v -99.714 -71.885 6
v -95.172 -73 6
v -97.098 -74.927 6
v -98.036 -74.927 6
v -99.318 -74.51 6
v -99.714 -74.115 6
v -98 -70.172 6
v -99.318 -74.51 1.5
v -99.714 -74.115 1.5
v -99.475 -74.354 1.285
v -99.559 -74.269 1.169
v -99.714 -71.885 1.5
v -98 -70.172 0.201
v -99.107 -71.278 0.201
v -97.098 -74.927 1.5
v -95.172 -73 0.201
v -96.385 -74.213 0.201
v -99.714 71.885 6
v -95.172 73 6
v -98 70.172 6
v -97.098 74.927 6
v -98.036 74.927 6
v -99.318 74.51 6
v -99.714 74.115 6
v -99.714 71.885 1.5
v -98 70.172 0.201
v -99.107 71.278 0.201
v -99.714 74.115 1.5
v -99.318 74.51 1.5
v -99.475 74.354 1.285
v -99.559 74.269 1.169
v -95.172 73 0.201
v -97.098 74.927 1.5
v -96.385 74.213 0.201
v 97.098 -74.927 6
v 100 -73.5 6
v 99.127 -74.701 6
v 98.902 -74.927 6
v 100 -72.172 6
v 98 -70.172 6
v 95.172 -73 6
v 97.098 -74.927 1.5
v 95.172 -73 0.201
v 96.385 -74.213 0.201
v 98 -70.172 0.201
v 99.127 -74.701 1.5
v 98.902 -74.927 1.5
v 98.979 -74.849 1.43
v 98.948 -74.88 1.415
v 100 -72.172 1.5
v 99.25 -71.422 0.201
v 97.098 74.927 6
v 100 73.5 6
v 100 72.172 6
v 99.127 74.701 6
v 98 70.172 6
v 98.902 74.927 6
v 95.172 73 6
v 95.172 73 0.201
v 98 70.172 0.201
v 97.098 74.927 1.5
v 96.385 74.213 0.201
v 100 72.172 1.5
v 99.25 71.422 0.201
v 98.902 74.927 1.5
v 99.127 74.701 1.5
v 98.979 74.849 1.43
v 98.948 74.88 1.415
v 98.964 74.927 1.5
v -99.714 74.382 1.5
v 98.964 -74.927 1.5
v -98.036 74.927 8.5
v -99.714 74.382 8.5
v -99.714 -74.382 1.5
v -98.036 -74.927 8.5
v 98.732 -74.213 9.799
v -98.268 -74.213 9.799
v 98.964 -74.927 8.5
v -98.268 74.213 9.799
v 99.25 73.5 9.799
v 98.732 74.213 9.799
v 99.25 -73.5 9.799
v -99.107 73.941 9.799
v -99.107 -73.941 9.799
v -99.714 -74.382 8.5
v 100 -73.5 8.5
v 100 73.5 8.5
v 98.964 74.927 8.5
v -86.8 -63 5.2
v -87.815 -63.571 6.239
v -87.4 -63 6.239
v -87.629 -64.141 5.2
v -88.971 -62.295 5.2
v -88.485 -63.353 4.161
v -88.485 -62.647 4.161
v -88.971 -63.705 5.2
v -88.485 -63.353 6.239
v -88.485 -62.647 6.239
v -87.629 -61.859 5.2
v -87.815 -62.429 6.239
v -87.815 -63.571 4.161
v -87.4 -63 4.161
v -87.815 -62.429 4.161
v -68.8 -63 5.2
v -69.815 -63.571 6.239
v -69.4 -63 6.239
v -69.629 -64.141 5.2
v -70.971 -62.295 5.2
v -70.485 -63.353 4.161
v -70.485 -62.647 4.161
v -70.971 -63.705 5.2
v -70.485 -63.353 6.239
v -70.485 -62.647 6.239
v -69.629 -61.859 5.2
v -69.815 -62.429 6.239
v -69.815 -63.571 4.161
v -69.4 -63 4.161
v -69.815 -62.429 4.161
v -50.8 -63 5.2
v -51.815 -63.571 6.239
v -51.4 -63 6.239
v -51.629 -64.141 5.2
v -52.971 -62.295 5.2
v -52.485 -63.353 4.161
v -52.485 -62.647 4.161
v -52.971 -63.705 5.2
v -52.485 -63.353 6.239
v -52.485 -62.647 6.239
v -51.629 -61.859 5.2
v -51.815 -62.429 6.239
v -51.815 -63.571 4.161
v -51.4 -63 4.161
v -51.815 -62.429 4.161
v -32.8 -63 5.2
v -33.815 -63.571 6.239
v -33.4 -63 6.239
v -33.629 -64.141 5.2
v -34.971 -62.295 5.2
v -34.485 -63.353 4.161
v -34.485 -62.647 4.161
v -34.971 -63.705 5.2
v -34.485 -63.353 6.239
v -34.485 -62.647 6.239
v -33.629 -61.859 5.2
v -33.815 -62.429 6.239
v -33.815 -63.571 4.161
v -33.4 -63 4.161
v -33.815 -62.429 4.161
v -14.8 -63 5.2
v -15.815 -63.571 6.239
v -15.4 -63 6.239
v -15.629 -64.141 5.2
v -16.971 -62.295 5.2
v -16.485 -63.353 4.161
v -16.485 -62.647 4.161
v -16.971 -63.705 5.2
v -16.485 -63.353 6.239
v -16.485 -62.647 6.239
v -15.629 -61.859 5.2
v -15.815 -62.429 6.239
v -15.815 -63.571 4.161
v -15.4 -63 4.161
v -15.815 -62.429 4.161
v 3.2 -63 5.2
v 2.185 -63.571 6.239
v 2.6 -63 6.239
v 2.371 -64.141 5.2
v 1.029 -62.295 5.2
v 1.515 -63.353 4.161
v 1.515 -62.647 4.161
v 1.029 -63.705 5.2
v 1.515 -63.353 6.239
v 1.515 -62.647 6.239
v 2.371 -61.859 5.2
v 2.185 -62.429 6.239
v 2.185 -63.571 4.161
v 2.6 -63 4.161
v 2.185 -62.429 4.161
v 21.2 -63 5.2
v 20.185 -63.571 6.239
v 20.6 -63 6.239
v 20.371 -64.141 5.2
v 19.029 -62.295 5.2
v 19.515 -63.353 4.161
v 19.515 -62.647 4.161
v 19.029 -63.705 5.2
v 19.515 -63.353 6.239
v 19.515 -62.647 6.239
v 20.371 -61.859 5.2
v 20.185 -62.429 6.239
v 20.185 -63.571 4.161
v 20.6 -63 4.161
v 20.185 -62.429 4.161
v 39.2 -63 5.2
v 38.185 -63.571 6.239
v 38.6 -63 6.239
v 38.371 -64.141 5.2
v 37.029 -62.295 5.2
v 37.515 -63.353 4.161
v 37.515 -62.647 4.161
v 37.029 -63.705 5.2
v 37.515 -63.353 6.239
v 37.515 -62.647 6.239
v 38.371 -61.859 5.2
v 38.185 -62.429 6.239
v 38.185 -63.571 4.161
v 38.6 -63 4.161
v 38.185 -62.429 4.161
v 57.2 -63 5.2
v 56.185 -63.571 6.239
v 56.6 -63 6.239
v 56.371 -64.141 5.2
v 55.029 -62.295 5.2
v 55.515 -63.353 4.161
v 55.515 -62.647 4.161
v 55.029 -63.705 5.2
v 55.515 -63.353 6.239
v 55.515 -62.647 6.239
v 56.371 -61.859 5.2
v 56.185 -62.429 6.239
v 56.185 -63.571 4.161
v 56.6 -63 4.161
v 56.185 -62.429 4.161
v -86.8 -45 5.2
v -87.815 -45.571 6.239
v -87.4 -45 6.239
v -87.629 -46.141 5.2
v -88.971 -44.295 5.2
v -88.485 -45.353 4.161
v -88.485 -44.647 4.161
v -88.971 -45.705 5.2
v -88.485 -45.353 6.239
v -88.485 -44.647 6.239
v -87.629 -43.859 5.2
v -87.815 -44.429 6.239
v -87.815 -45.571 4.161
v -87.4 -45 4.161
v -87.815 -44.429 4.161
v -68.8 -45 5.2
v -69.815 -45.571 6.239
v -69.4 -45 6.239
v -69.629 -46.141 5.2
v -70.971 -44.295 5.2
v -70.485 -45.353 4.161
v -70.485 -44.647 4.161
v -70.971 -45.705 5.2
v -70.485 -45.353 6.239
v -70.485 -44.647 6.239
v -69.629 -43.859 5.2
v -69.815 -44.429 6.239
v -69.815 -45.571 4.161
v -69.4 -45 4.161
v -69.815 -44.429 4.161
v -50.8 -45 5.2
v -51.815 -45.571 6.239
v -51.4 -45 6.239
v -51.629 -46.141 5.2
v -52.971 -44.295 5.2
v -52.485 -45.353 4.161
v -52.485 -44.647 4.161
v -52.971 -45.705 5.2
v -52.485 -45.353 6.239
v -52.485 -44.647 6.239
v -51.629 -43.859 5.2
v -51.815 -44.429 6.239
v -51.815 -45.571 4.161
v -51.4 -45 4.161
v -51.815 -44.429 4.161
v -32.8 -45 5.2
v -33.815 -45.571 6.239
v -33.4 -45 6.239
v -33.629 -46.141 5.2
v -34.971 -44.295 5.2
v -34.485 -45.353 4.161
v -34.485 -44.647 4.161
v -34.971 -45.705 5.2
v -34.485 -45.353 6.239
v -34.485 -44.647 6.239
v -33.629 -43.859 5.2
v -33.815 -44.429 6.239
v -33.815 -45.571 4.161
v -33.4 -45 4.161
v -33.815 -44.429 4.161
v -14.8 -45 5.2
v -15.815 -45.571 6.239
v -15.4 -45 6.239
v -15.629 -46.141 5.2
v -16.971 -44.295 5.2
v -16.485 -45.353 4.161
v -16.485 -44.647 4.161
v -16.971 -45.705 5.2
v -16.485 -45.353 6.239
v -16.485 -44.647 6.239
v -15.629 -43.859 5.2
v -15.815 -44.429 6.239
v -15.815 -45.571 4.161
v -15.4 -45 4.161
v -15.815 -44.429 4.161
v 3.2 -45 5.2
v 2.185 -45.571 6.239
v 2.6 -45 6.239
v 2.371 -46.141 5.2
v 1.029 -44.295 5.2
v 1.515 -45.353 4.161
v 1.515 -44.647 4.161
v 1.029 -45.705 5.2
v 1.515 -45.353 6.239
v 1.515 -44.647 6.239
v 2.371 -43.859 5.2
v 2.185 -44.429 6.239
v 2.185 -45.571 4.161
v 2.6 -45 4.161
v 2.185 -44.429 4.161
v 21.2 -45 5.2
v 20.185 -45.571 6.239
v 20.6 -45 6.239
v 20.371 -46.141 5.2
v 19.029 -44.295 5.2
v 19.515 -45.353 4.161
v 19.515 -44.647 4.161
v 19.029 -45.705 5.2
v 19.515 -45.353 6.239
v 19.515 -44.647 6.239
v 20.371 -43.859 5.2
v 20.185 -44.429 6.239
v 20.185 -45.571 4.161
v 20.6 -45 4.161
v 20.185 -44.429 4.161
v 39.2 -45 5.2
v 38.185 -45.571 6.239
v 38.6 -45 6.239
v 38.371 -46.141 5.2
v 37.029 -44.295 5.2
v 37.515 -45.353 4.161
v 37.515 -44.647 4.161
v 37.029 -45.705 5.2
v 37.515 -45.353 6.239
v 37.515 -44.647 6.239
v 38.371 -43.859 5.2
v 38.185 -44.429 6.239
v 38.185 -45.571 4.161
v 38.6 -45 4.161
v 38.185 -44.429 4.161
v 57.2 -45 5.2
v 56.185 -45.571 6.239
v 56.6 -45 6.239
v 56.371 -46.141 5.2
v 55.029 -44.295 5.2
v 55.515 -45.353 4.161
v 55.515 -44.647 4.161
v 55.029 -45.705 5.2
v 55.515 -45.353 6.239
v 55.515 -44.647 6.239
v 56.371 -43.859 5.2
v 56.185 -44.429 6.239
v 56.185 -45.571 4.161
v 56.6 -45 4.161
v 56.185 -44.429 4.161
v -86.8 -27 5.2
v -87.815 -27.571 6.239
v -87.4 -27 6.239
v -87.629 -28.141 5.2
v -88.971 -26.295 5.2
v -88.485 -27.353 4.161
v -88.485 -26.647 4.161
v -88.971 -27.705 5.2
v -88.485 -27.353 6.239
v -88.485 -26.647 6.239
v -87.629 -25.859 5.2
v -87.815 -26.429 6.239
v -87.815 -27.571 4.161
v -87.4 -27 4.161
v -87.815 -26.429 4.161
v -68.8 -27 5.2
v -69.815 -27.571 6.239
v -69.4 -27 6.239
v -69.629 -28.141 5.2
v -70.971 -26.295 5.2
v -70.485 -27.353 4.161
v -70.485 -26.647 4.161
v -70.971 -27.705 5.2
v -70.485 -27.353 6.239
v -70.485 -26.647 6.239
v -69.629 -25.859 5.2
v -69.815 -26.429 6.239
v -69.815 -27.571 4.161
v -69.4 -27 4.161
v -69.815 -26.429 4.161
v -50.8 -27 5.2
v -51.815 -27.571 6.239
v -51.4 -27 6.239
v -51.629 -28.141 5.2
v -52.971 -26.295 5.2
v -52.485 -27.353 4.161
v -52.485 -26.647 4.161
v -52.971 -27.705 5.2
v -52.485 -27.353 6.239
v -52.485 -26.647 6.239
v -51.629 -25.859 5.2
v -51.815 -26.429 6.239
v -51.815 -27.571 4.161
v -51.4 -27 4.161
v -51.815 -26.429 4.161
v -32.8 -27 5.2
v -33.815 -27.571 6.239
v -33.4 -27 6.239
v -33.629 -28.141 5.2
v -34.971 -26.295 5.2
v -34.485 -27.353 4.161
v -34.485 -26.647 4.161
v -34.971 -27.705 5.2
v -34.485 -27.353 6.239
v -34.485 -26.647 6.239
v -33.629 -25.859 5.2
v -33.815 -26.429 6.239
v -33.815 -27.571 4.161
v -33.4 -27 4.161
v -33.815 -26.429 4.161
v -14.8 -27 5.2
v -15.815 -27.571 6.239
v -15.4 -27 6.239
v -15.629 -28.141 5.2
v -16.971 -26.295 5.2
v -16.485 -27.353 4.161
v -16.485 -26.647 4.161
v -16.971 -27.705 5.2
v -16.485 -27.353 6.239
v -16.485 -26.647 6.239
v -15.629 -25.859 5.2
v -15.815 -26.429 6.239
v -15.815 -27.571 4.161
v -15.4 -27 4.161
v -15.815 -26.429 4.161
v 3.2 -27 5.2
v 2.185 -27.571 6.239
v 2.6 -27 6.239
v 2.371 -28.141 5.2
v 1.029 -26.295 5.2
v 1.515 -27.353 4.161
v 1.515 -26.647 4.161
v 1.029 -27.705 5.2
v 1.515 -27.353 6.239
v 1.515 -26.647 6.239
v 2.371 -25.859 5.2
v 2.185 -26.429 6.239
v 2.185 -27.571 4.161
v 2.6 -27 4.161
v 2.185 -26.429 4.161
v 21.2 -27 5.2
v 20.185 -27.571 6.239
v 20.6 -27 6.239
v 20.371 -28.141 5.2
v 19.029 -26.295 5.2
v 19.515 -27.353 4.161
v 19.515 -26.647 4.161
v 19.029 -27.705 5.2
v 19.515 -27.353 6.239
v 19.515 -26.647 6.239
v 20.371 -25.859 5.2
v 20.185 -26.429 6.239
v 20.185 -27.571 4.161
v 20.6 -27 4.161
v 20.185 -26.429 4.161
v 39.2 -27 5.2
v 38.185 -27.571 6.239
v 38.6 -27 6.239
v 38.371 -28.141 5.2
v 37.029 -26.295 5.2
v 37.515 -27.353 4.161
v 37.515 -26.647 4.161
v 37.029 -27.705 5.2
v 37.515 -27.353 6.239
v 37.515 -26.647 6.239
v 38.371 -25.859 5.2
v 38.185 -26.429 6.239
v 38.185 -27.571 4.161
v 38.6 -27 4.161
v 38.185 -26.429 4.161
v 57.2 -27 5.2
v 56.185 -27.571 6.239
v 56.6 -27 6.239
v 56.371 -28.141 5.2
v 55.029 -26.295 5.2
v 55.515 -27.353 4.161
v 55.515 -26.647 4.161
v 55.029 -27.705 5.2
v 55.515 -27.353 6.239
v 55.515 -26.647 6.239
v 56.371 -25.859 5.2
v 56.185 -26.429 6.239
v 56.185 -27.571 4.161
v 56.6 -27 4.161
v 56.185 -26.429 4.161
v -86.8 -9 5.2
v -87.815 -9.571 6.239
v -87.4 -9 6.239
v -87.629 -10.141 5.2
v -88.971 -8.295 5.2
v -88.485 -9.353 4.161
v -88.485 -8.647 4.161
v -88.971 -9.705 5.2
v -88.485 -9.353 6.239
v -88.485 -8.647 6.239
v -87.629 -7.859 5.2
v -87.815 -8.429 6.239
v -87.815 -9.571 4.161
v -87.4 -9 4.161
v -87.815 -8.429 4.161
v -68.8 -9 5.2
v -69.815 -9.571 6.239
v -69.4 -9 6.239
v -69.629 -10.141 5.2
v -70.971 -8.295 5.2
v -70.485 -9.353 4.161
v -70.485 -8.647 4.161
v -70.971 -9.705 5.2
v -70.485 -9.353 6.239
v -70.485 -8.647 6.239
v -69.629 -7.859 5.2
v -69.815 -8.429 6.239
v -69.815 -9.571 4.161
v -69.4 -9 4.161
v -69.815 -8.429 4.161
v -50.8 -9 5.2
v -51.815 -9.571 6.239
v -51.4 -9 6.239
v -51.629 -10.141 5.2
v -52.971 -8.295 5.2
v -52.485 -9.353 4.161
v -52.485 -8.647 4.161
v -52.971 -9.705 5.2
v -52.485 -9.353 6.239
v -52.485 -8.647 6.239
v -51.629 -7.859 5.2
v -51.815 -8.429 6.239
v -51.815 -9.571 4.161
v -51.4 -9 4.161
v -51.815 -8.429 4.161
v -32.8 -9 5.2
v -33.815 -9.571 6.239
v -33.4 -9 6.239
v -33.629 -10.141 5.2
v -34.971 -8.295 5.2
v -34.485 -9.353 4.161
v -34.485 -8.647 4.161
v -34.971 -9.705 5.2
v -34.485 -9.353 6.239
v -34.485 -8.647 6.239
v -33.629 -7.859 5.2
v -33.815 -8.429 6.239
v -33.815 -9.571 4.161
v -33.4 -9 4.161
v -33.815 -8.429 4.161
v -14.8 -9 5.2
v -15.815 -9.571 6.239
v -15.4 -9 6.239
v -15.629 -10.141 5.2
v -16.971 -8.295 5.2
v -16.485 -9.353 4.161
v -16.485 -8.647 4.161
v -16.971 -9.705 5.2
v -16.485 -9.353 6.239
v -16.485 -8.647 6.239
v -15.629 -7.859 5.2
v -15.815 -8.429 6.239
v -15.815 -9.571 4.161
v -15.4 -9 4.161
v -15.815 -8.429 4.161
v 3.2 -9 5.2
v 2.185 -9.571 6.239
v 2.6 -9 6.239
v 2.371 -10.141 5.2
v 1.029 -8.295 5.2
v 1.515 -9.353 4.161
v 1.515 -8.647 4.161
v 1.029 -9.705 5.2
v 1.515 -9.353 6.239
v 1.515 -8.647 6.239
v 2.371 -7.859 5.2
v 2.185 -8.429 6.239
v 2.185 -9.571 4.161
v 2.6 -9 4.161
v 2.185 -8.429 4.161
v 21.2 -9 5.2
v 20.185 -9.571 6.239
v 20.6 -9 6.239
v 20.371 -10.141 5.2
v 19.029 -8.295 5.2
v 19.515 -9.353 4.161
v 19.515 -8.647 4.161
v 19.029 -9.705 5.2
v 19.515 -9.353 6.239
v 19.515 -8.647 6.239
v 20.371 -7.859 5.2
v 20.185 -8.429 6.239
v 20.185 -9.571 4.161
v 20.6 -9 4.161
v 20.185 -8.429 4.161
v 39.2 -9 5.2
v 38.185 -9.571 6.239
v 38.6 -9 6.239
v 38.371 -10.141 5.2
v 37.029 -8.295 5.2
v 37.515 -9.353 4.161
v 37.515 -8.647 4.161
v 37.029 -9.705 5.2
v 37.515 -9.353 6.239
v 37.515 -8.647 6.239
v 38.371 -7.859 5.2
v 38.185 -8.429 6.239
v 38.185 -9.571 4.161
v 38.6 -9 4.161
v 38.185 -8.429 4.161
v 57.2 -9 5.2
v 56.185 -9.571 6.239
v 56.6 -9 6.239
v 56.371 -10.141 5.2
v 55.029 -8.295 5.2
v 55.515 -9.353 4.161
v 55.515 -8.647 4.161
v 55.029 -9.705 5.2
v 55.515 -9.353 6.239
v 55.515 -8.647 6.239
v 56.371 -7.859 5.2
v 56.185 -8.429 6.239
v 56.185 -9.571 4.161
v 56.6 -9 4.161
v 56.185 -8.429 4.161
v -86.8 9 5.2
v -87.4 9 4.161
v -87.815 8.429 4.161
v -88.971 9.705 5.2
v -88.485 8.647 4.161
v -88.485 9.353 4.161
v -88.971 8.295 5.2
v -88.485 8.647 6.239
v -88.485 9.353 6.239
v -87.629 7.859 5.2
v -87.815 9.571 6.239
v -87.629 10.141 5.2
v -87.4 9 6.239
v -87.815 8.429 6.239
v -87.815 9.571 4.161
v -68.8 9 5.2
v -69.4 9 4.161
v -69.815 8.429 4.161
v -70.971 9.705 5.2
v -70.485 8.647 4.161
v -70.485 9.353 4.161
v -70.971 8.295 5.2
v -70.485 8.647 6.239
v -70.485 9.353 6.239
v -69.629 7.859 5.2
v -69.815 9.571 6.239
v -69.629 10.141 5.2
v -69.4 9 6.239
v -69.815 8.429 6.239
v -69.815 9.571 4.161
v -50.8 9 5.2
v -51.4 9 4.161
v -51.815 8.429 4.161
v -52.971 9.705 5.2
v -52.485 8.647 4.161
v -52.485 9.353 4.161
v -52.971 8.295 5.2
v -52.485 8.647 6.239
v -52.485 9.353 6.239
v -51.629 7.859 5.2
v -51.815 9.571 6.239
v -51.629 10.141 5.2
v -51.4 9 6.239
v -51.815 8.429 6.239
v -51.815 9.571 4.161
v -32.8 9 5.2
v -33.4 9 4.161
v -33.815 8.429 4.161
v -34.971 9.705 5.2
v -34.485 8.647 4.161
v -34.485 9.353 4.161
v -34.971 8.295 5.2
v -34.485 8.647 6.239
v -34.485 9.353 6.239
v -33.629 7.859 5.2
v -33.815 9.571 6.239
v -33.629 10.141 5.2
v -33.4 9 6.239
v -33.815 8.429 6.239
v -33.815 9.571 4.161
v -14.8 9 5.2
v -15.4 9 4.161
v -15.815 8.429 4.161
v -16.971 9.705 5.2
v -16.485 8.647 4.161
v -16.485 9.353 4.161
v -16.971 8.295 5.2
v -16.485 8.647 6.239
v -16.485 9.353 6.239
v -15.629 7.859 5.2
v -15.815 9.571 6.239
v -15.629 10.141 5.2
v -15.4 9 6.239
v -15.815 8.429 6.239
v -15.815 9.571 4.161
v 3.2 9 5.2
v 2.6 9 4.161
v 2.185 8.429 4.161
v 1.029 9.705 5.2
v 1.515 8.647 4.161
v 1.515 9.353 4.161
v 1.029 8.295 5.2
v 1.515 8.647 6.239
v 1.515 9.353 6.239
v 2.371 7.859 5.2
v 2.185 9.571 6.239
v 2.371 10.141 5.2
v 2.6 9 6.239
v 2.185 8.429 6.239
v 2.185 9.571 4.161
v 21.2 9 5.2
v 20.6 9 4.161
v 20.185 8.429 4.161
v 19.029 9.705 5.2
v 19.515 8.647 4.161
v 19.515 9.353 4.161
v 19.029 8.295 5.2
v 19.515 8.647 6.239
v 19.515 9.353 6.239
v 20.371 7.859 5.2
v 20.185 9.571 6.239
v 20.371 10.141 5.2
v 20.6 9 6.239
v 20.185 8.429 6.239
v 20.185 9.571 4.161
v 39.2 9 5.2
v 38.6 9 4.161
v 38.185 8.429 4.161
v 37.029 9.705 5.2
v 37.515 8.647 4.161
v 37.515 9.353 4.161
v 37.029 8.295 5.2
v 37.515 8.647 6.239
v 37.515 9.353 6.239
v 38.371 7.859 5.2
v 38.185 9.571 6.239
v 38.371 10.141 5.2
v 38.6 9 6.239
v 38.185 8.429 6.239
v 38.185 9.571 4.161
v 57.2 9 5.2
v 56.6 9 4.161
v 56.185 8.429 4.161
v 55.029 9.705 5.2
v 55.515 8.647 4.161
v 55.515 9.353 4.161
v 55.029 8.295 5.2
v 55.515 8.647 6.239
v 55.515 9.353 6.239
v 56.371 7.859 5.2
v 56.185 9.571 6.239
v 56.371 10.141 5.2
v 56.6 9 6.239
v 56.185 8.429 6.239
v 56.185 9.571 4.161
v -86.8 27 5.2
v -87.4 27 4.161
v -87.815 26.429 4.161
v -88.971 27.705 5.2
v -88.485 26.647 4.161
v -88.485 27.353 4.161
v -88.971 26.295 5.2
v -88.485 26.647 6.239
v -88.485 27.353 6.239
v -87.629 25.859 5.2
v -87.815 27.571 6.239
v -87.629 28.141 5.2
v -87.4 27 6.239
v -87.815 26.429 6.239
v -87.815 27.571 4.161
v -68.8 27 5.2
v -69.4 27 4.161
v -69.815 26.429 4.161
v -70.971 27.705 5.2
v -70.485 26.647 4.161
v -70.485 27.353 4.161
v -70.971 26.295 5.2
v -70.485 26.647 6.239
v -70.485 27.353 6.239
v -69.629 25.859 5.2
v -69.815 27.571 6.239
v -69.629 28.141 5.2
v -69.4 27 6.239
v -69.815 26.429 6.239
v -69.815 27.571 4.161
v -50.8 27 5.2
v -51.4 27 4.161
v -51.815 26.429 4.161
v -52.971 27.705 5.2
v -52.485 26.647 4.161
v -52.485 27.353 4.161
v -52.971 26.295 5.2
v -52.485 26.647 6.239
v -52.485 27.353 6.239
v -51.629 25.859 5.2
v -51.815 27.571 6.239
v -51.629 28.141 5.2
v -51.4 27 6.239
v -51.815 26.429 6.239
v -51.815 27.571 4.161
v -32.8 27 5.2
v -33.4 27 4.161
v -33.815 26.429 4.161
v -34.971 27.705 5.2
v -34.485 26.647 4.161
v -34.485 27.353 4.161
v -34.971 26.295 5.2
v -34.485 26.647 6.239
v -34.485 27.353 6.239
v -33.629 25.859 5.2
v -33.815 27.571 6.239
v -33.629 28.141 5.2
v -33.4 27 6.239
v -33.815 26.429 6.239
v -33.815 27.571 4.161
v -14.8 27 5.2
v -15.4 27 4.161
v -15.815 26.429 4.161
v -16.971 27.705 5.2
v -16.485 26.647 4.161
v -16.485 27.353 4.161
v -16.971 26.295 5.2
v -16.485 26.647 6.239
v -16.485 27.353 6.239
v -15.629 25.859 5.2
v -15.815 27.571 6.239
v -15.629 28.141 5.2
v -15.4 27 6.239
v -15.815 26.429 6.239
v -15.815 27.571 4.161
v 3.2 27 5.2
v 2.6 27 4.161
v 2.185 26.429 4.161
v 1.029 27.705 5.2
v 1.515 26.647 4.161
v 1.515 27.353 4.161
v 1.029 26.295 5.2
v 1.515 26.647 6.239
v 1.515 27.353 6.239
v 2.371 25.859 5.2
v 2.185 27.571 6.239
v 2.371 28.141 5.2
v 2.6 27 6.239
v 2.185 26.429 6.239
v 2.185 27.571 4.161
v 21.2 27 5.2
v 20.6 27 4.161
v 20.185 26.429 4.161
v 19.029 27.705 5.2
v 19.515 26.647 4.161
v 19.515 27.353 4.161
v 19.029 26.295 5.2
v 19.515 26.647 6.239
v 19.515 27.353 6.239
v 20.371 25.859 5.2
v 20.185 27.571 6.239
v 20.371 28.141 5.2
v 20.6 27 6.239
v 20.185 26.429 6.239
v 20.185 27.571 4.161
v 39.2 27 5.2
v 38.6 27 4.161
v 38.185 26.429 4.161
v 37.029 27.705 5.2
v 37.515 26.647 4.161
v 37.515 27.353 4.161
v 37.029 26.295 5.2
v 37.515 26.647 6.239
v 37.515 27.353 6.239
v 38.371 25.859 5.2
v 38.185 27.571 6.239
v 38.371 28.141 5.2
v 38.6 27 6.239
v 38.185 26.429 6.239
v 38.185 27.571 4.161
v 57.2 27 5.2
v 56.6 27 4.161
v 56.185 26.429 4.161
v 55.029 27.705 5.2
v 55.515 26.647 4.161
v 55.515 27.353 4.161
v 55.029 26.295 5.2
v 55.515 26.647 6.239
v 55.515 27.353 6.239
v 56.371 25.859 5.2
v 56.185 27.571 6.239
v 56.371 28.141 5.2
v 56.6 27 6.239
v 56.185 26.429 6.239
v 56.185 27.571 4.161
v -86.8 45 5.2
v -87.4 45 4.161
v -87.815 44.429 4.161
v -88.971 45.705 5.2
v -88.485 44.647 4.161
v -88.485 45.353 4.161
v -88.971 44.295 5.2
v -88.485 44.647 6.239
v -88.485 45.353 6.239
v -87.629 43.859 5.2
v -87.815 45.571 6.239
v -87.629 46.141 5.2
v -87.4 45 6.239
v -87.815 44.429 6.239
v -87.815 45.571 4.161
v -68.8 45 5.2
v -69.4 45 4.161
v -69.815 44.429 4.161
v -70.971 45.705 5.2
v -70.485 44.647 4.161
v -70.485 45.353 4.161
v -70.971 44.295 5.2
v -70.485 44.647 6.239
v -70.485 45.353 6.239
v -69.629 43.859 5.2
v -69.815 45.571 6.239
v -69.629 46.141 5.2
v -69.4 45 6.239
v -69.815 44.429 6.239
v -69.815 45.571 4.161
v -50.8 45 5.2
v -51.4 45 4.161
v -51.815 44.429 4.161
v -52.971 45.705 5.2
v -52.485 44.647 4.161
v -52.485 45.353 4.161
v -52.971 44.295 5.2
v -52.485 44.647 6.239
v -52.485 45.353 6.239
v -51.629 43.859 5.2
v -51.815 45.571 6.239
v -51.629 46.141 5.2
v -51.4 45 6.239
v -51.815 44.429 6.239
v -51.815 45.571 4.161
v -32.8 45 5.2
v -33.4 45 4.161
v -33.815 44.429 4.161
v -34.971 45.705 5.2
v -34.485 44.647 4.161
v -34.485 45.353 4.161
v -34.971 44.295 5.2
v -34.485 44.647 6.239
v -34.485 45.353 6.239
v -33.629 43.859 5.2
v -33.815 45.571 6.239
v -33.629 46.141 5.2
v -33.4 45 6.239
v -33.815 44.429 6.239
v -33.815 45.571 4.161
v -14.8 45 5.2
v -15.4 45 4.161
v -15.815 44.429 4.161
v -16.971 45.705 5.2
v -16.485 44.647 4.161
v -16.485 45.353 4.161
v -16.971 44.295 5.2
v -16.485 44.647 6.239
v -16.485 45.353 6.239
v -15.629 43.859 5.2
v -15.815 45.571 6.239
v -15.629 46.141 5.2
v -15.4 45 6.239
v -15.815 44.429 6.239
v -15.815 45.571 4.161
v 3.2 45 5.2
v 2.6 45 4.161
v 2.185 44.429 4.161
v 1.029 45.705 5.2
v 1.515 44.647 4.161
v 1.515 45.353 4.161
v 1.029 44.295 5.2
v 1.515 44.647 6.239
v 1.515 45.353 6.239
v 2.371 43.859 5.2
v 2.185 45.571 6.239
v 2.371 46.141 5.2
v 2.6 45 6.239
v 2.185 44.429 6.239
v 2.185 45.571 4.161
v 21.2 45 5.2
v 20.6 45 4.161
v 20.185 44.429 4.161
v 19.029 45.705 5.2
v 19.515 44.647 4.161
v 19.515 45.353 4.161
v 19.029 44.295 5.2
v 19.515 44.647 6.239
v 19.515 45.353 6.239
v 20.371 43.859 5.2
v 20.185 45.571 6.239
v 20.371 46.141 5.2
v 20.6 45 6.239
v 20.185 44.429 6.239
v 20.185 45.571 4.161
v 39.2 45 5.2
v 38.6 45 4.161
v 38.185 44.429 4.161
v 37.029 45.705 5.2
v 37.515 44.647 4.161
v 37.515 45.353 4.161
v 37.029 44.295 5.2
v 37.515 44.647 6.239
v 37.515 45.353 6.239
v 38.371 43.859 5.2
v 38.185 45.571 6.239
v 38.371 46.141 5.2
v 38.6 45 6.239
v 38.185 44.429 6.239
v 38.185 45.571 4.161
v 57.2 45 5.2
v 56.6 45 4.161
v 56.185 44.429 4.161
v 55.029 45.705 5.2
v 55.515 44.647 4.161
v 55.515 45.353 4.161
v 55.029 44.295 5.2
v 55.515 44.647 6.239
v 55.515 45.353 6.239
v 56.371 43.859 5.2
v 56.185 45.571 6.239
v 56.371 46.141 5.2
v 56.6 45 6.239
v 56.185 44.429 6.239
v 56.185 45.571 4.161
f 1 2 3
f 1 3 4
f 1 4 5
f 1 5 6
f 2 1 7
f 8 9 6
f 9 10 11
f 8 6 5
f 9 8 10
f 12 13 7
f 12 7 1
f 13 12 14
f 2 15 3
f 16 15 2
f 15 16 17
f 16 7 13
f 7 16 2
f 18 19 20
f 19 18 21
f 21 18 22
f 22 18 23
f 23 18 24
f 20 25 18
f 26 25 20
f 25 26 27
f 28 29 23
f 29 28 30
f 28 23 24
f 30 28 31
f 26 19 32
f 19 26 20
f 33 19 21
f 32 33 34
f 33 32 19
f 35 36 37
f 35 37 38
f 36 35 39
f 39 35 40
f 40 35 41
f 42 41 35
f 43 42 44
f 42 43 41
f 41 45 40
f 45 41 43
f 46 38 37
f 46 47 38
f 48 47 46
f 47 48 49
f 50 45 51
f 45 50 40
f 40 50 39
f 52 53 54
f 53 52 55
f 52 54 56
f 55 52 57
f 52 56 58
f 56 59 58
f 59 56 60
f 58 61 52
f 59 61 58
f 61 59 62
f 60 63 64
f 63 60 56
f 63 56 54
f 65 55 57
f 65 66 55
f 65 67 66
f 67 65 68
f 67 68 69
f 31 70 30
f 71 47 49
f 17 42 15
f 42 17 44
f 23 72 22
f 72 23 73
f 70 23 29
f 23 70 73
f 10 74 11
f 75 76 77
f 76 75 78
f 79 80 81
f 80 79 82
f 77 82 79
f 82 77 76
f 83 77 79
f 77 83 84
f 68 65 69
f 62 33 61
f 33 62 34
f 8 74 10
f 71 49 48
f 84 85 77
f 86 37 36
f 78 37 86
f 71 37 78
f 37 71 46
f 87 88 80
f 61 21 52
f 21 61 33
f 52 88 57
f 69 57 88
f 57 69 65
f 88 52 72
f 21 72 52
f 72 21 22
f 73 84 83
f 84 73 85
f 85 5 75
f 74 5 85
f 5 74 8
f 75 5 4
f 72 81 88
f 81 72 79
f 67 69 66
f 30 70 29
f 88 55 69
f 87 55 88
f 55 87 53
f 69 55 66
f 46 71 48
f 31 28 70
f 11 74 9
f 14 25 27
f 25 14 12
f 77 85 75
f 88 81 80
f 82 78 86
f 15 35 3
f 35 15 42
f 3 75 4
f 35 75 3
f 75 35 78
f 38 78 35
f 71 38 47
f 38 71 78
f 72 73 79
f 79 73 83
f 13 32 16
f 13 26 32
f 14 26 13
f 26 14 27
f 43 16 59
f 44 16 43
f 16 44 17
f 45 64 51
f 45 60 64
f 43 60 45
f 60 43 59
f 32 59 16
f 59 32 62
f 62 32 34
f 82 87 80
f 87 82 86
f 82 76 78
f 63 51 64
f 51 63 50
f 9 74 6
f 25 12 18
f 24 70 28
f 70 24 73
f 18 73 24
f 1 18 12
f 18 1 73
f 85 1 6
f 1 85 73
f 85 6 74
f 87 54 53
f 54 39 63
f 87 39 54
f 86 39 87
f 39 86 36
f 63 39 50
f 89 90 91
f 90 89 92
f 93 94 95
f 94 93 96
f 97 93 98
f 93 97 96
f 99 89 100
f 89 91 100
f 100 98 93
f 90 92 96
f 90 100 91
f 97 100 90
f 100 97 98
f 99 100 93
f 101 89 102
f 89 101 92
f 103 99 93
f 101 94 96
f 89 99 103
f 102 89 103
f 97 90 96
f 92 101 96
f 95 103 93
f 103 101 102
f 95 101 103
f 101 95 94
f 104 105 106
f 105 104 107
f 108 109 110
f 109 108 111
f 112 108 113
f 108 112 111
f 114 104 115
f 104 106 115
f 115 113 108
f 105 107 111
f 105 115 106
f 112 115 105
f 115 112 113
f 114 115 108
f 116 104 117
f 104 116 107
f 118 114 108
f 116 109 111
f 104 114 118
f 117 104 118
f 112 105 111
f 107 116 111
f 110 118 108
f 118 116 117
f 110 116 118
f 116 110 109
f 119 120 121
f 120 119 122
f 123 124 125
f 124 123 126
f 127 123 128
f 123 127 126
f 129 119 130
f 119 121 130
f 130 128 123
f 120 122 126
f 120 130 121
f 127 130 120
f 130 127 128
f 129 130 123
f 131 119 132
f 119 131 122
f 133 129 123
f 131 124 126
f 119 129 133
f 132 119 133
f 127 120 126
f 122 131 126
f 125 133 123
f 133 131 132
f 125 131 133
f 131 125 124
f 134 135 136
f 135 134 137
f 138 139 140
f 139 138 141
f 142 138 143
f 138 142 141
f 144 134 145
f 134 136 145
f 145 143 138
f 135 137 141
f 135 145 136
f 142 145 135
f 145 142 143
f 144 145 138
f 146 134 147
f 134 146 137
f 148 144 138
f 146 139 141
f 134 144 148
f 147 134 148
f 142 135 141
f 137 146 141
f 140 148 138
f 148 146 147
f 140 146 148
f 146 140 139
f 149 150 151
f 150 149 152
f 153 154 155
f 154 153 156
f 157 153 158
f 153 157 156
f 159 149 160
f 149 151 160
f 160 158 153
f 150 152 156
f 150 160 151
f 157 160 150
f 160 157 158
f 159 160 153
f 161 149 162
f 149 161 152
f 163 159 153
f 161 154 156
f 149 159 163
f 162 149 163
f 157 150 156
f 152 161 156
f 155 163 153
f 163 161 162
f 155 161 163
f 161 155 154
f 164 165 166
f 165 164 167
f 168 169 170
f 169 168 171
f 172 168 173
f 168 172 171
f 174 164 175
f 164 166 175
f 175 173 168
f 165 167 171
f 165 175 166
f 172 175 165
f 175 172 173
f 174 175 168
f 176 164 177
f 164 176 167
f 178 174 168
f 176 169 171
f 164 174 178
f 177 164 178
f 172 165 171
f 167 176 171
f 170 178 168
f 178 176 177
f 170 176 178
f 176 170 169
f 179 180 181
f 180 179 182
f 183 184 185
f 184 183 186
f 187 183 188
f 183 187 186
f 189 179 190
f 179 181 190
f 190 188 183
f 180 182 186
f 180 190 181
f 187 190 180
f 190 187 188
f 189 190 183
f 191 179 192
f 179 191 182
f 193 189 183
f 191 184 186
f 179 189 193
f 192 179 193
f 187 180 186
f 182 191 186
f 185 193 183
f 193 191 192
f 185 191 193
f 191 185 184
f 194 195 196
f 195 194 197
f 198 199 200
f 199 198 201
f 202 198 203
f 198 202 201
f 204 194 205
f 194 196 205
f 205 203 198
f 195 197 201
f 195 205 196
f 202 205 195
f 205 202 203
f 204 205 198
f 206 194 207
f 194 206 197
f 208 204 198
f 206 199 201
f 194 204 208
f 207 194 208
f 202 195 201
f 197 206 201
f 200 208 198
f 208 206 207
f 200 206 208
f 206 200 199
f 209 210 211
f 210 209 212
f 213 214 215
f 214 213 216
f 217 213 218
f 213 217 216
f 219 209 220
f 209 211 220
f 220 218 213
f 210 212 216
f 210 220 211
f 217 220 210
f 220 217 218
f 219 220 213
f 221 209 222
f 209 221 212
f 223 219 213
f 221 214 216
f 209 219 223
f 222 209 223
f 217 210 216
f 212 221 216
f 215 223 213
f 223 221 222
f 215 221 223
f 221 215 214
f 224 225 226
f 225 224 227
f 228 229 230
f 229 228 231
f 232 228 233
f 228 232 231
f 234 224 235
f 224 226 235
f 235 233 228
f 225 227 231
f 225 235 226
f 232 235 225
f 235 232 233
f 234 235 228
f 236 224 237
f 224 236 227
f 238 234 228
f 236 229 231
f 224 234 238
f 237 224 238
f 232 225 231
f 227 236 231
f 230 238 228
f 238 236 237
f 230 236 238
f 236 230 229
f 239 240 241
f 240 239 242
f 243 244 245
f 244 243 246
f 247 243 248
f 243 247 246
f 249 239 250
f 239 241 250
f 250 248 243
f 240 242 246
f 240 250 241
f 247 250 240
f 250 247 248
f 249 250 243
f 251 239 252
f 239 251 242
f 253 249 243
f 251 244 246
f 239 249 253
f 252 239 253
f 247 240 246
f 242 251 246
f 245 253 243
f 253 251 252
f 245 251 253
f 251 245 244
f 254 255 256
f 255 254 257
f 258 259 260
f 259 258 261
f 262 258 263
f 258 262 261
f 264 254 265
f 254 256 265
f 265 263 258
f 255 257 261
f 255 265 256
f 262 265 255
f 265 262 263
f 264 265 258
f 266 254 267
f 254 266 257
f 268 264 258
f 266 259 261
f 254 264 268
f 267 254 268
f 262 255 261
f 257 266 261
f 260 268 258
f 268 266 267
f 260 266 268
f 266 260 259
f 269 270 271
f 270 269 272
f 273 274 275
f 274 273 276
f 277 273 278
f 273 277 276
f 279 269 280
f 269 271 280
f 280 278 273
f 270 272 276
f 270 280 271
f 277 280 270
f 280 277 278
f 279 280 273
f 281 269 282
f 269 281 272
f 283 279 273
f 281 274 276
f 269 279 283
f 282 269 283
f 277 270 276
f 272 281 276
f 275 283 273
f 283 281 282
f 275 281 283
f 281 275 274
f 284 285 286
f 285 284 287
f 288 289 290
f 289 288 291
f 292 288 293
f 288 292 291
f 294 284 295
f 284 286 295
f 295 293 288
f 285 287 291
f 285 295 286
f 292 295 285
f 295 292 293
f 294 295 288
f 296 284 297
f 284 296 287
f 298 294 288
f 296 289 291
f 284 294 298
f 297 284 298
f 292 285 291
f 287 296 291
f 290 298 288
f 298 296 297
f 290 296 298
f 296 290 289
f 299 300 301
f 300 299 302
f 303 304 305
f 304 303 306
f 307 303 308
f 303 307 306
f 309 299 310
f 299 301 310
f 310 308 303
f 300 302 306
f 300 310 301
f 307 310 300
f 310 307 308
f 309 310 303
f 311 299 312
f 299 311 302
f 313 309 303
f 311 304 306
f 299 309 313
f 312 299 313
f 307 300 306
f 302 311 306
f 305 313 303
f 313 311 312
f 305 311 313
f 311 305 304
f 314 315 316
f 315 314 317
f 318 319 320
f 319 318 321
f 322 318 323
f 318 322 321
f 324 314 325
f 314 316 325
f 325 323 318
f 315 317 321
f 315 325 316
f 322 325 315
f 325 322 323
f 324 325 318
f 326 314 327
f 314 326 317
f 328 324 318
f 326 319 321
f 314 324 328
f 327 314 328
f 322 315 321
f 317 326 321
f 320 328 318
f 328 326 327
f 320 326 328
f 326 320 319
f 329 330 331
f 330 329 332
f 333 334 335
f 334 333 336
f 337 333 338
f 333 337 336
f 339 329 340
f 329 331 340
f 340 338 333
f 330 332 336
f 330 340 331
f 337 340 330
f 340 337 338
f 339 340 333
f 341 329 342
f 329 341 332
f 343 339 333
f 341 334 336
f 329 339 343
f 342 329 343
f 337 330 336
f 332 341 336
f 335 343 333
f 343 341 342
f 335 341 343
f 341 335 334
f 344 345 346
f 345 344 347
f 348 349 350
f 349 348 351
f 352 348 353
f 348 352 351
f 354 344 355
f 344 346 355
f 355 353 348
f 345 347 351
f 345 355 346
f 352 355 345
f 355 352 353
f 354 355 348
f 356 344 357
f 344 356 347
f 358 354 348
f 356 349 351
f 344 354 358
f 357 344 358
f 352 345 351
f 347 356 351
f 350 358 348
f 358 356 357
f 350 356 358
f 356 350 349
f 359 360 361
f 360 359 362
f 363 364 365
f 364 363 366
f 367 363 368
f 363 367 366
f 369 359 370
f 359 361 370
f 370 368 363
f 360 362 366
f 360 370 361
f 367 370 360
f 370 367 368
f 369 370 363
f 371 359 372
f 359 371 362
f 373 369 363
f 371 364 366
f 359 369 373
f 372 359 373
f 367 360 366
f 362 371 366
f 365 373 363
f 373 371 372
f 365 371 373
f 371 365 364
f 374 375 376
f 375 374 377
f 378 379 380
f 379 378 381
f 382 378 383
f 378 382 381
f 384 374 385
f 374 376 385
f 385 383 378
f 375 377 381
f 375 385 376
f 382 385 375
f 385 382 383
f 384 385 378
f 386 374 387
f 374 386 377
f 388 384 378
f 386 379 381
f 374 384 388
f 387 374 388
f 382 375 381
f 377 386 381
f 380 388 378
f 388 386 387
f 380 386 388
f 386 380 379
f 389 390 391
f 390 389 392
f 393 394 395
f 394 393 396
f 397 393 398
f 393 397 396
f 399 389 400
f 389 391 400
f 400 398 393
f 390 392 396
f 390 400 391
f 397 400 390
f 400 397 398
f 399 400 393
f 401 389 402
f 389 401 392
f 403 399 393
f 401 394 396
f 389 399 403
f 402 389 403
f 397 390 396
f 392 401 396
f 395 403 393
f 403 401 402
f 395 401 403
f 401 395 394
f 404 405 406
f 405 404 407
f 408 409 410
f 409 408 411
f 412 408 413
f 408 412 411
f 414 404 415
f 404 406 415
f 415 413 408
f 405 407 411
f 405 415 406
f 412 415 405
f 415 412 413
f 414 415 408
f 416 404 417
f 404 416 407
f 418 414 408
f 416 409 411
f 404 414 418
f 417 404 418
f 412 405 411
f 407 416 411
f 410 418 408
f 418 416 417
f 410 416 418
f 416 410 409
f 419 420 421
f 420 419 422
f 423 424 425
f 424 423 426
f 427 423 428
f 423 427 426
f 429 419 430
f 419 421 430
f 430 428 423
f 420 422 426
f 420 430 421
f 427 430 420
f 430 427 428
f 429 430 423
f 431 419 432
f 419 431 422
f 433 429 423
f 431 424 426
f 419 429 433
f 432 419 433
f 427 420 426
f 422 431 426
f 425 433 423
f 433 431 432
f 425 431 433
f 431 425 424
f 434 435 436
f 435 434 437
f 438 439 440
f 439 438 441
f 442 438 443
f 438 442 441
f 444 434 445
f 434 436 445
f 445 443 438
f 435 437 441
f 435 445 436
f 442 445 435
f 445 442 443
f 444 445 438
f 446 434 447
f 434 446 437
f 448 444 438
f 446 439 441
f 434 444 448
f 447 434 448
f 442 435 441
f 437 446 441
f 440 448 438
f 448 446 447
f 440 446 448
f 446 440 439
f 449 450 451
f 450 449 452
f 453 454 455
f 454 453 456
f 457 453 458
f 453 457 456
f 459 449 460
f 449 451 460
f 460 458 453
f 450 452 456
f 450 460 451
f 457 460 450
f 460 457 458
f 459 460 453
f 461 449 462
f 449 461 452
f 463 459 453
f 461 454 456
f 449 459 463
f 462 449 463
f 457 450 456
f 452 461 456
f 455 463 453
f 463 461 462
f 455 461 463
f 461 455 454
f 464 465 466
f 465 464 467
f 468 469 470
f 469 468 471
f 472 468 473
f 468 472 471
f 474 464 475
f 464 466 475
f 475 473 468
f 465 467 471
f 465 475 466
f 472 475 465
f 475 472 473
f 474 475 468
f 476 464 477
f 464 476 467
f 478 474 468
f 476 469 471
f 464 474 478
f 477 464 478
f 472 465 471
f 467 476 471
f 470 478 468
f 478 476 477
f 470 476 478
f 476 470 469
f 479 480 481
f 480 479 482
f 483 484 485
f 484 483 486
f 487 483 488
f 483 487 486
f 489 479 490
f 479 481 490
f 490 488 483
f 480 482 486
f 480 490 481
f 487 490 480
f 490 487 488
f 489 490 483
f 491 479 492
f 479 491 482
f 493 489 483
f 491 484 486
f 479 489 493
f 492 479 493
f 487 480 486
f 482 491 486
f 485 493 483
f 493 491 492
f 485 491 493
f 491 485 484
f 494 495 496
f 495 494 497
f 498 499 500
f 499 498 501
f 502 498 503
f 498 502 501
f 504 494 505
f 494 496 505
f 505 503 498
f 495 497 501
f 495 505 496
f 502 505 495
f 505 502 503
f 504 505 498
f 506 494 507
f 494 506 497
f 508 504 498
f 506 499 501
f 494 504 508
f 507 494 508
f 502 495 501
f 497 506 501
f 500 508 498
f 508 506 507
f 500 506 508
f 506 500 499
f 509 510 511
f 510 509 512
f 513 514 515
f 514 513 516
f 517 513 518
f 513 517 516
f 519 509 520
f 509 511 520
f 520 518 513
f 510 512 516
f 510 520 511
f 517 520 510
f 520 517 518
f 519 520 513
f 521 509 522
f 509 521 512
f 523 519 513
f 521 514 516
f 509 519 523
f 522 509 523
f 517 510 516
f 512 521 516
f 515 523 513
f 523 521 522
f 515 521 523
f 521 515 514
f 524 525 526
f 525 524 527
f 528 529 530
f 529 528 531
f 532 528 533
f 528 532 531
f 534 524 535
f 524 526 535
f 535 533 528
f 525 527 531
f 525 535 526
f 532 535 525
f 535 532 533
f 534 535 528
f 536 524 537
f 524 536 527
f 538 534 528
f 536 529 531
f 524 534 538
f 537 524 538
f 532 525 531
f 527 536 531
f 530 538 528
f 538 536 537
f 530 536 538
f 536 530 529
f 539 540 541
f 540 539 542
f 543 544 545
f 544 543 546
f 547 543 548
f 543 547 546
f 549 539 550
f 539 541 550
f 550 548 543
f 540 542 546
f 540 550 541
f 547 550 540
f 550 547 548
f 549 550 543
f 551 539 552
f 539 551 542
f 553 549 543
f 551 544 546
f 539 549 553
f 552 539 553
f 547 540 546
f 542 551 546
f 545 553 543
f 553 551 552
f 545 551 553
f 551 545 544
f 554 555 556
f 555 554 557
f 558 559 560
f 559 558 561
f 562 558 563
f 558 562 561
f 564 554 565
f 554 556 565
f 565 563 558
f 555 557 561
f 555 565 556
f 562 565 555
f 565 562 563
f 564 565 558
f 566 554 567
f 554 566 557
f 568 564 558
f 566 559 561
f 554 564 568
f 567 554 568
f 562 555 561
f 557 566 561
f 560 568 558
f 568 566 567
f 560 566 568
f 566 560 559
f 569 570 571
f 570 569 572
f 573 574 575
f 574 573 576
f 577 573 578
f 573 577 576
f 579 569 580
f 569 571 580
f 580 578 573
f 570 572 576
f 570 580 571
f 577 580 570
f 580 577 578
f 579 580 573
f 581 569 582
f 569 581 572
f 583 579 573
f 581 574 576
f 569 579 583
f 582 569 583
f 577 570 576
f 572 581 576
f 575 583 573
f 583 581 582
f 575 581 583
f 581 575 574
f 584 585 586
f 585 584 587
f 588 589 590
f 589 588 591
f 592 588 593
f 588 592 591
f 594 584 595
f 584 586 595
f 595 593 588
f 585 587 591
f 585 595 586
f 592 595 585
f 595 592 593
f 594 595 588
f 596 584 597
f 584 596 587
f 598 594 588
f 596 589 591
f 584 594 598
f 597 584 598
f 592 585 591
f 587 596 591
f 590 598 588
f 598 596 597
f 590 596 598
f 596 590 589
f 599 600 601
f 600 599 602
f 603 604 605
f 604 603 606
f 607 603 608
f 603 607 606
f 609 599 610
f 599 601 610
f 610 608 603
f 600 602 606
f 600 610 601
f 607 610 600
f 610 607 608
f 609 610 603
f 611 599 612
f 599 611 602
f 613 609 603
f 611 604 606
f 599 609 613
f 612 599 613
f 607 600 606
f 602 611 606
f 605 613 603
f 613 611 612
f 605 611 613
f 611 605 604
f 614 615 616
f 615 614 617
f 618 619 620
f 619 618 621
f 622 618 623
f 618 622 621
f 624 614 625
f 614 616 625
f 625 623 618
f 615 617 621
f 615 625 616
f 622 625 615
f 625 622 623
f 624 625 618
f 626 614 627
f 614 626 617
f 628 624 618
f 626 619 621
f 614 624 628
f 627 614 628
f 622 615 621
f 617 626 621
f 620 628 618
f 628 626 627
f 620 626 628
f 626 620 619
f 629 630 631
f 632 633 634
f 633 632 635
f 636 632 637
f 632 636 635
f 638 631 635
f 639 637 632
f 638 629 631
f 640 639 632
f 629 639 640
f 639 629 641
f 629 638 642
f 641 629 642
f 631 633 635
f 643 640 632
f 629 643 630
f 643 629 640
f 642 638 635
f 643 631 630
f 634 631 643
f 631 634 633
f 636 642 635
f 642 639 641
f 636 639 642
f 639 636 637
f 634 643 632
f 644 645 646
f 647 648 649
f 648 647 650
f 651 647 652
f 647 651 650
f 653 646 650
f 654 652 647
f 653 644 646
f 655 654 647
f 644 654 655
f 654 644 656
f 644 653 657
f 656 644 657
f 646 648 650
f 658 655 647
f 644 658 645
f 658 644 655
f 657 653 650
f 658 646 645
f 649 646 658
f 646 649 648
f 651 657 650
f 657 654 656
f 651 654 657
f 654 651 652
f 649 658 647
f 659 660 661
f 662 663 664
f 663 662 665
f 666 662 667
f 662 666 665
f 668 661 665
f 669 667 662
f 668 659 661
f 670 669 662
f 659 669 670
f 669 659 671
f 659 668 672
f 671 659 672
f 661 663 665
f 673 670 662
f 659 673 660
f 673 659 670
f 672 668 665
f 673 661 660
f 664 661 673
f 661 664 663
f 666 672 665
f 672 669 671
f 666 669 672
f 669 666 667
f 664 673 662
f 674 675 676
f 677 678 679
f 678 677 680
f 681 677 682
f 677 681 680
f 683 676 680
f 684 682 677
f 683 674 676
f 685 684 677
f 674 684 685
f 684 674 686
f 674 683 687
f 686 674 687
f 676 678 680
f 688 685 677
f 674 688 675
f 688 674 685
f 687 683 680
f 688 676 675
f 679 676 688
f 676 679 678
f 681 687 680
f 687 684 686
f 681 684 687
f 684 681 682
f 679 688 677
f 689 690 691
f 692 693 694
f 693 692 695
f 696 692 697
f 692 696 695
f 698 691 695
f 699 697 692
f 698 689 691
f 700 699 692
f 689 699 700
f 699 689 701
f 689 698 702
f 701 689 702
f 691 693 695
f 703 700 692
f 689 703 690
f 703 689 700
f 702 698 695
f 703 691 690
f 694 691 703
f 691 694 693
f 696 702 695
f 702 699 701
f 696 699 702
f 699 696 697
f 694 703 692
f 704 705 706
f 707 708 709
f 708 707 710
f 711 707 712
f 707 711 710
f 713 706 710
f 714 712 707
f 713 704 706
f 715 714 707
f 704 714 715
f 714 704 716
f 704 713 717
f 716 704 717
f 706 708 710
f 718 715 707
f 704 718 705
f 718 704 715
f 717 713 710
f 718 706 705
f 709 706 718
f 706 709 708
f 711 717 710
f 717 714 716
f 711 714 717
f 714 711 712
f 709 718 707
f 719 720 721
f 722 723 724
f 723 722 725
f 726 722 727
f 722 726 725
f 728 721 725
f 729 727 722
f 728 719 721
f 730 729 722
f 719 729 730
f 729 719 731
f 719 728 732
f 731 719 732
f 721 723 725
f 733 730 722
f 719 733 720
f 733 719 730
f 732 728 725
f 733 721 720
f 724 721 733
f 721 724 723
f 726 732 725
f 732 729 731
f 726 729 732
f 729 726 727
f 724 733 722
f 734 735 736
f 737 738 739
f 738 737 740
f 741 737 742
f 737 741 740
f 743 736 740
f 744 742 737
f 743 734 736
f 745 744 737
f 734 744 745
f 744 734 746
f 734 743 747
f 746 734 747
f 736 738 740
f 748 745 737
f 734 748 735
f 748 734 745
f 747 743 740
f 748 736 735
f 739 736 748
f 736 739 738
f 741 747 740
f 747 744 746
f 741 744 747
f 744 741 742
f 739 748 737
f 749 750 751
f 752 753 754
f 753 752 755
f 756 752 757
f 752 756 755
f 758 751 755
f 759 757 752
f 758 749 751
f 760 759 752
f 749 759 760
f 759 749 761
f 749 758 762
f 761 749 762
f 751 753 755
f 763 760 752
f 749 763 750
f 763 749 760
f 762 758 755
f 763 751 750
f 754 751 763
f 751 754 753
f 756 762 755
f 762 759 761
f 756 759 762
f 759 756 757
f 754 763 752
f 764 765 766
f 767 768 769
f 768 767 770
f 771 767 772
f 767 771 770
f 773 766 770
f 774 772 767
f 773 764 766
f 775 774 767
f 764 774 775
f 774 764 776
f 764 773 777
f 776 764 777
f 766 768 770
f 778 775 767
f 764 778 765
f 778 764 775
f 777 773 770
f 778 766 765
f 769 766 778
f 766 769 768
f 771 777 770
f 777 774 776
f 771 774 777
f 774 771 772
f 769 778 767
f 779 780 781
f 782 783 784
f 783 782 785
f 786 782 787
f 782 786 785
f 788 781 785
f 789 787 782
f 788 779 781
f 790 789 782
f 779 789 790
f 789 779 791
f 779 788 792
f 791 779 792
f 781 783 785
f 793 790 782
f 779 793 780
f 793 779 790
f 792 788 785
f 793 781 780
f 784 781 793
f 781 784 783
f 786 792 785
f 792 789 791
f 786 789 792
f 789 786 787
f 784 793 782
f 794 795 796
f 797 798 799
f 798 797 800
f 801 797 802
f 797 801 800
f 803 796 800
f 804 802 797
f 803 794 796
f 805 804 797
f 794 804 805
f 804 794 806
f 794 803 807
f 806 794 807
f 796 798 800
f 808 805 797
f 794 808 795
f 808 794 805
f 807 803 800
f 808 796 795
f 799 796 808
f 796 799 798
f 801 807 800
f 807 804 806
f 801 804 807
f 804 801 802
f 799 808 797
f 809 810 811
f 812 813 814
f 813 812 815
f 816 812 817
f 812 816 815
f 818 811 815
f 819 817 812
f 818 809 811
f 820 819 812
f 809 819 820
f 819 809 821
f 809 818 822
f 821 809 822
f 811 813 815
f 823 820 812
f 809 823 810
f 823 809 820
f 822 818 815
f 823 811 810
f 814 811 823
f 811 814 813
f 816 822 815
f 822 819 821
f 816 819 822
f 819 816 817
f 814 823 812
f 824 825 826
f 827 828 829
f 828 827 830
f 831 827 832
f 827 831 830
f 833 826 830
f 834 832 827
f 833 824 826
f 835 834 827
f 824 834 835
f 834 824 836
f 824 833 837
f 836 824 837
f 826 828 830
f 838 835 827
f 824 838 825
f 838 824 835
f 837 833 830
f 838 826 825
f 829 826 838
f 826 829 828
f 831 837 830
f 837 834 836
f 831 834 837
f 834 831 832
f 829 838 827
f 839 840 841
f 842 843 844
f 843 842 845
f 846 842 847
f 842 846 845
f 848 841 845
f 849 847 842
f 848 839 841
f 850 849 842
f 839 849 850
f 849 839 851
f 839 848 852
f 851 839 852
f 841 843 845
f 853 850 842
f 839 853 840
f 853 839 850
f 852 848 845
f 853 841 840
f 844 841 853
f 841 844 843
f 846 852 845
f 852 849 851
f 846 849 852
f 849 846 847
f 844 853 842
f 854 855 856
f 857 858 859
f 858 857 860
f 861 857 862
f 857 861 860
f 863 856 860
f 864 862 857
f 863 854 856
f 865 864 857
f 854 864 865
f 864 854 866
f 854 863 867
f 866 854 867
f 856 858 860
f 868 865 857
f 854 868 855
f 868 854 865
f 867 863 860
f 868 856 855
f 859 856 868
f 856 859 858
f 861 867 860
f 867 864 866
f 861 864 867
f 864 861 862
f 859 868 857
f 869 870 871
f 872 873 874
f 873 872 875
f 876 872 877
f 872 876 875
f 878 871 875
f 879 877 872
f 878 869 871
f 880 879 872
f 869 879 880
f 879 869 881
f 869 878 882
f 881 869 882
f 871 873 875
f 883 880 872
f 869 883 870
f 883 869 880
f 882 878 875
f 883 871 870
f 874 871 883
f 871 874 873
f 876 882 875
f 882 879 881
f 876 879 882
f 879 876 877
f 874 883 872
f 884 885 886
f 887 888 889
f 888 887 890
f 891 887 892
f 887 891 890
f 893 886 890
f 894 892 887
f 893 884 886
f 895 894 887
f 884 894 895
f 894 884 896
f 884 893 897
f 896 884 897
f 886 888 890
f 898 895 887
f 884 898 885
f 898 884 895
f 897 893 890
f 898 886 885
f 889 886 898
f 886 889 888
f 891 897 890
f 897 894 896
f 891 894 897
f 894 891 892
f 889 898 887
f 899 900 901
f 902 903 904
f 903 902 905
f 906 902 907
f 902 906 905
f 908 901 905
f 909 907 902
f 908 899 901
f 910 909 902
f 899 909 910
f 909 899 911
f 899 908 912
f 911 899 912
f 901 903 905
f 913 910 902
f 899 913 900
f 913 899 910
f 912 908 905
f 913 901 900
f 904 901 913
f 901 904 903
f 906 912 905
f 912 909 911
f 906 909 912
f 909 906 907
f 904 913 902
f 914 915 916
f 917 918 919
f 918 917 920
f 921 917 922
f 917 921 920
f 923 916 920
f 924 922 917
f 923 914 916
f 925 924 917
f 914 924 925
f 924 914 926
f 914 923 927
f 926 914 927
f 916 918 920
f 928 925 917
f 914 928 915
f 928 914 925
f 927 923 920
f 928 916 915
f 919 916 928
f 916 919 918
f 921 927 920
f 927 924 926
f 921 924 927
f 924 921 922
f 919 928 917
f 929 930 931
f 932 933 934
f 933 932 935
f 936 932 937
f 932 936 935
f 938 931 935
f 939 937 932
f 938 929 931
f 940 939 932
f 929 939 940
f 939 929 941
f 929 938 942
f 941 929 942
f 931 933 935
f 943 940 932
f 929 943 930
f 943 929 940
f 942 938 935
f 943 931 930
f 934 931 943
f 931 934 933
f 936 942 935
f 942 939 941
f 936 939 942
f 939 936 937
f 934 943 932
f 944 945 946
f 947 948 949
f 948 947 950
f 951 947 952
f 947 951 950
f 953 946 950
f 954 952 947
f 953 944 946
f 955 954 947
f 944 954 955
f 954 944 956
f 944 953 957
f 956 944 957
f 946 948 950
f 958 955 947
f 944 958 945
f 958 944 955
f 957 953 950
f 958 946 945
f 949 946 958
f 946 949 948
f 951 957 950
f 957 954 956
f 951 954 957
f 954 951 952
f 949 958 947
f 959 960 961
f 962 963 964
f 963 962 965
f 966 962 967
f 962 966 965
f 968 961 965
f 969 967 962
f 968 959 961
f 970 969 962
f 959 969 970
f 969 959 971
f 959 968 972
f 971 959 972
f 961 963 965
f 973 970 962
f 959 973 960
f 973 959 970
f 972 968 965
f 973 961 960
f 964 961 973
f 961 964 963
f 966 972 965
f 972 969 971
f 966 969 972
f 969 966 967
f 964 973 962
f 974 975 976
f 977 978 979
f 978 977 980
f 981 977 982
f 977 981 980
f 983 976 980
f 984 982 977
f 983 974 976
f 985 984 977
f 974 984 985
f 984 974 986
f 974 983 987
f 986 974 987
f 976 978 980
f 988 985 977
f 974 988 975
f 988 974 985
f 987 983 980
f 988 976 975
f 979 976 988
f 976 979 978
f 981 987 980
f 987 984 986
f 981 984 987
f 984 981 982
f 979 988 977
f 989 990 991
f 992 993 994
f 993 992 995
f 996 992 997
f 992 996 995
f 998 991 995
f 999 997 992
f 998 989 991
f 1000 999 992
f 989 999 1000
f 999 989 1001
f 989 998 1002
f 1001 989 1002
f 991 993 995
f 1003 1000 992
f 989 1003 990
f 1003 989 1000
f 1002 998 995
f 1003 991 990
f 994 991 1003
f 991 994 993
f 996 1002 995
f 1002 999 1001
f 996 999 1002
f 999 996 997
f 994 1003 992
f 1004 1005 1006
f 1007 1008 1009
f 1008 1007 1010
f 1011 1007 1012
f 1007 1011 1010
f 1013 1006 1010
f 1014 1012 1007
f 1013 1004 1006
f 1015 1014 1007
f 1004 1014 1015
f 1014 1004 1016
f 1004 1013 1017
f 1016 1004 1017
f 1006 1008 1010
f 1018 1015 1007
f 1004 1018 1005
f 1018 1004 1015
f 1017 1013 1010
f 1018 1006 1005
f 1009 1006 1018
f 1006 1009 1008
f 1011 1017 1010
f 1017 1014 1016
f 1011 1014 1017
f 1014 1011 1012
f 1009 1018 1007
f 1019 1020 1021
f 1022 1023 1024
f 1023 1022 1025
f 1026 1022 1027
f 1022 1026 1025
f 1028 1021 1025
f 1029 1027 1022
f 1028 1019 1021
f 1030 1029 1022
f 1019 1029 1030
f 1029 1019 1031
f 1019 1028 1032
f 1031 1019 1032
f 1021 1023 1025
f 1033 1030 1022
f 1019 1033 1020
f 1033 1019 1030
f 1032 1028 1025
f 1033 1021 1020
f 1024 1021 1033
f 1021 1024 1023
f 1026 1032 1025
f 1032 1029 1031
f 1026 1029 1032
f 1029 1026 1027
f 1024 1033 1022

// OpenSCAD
// Parameters
sheet_length = 200; //[100:400:1]
sheet_width = 150; //[75:300:1]
sheet_thickness = 10; //[5:20:1]
edge_radius = 3; //[1.5:6:0.5]
corner_chamfer = 4; //[2:8:0.5]
pore_radius = 1.2; //[0.6:2.4:0.1]
pore_depth = 0.8; //[0.3:1.6:0.1]
pore_pitch_x = 18; //[10:30:1]
pore_pitch_y = 18; //[10:30:1]
pore_margin = 12; //[6:24:1]
pore_rows = 7; //[3:12:1]
pore_cols = 9; //[3:16:1]
pore_z_overlap = 0.6; //[0.3:1.2:0.1]
rounding_sphere_radius = 1.5; //[0.8:3:0.1]

// Foam Sheet with Rounded Edges and Corner Chamfers
module foam_sheet() {
  difference() {
    // Rounded edges using minkowski with a sphere
    minkowski() {
      translate([0, 0, sheet_thickness/2])
        cube([sheet_length - 2*rounding_sphere_radius, sheet_width - 2*rounding_sphere_radius, sheet_thickness - 2*rounding_sphere_radius], center=true);
      sphere(r=rounding_sphere_radius);
    }
    
    // Corner chamfers
    for (x = [-1, 1], y = [-1, 1]) {
      translate([x * (sheet_length/2 - corner_chamfer/2), y * (sheet_width/2 - corner_chamfer/2), 0])
        rotate([0, 0, 45])
          cube([corner_chamfer, corner_chamfer, sheet_thickness + 2], center=true);
    }
  }
}

// Pore Texture
module pore_texture() {
  for (row = [0:pore_rows-1], col = [0:pore_cols-1]) {
    translate([
      -sheet_length/2 + pore_margin + col * pore_pitch_x,
      -sheet_width/2 + pore_margin + row * pore_pitch_y,
      sheet_thickness/2 - pore_depth/2 + pore_z_overlap
    ])
    sphere(r=pore_radius, center=true);
  }
}

// Final Foam Sheet with Surface Pore Texture
difference() {
  foam_sheet();
  pore_texture();
}
